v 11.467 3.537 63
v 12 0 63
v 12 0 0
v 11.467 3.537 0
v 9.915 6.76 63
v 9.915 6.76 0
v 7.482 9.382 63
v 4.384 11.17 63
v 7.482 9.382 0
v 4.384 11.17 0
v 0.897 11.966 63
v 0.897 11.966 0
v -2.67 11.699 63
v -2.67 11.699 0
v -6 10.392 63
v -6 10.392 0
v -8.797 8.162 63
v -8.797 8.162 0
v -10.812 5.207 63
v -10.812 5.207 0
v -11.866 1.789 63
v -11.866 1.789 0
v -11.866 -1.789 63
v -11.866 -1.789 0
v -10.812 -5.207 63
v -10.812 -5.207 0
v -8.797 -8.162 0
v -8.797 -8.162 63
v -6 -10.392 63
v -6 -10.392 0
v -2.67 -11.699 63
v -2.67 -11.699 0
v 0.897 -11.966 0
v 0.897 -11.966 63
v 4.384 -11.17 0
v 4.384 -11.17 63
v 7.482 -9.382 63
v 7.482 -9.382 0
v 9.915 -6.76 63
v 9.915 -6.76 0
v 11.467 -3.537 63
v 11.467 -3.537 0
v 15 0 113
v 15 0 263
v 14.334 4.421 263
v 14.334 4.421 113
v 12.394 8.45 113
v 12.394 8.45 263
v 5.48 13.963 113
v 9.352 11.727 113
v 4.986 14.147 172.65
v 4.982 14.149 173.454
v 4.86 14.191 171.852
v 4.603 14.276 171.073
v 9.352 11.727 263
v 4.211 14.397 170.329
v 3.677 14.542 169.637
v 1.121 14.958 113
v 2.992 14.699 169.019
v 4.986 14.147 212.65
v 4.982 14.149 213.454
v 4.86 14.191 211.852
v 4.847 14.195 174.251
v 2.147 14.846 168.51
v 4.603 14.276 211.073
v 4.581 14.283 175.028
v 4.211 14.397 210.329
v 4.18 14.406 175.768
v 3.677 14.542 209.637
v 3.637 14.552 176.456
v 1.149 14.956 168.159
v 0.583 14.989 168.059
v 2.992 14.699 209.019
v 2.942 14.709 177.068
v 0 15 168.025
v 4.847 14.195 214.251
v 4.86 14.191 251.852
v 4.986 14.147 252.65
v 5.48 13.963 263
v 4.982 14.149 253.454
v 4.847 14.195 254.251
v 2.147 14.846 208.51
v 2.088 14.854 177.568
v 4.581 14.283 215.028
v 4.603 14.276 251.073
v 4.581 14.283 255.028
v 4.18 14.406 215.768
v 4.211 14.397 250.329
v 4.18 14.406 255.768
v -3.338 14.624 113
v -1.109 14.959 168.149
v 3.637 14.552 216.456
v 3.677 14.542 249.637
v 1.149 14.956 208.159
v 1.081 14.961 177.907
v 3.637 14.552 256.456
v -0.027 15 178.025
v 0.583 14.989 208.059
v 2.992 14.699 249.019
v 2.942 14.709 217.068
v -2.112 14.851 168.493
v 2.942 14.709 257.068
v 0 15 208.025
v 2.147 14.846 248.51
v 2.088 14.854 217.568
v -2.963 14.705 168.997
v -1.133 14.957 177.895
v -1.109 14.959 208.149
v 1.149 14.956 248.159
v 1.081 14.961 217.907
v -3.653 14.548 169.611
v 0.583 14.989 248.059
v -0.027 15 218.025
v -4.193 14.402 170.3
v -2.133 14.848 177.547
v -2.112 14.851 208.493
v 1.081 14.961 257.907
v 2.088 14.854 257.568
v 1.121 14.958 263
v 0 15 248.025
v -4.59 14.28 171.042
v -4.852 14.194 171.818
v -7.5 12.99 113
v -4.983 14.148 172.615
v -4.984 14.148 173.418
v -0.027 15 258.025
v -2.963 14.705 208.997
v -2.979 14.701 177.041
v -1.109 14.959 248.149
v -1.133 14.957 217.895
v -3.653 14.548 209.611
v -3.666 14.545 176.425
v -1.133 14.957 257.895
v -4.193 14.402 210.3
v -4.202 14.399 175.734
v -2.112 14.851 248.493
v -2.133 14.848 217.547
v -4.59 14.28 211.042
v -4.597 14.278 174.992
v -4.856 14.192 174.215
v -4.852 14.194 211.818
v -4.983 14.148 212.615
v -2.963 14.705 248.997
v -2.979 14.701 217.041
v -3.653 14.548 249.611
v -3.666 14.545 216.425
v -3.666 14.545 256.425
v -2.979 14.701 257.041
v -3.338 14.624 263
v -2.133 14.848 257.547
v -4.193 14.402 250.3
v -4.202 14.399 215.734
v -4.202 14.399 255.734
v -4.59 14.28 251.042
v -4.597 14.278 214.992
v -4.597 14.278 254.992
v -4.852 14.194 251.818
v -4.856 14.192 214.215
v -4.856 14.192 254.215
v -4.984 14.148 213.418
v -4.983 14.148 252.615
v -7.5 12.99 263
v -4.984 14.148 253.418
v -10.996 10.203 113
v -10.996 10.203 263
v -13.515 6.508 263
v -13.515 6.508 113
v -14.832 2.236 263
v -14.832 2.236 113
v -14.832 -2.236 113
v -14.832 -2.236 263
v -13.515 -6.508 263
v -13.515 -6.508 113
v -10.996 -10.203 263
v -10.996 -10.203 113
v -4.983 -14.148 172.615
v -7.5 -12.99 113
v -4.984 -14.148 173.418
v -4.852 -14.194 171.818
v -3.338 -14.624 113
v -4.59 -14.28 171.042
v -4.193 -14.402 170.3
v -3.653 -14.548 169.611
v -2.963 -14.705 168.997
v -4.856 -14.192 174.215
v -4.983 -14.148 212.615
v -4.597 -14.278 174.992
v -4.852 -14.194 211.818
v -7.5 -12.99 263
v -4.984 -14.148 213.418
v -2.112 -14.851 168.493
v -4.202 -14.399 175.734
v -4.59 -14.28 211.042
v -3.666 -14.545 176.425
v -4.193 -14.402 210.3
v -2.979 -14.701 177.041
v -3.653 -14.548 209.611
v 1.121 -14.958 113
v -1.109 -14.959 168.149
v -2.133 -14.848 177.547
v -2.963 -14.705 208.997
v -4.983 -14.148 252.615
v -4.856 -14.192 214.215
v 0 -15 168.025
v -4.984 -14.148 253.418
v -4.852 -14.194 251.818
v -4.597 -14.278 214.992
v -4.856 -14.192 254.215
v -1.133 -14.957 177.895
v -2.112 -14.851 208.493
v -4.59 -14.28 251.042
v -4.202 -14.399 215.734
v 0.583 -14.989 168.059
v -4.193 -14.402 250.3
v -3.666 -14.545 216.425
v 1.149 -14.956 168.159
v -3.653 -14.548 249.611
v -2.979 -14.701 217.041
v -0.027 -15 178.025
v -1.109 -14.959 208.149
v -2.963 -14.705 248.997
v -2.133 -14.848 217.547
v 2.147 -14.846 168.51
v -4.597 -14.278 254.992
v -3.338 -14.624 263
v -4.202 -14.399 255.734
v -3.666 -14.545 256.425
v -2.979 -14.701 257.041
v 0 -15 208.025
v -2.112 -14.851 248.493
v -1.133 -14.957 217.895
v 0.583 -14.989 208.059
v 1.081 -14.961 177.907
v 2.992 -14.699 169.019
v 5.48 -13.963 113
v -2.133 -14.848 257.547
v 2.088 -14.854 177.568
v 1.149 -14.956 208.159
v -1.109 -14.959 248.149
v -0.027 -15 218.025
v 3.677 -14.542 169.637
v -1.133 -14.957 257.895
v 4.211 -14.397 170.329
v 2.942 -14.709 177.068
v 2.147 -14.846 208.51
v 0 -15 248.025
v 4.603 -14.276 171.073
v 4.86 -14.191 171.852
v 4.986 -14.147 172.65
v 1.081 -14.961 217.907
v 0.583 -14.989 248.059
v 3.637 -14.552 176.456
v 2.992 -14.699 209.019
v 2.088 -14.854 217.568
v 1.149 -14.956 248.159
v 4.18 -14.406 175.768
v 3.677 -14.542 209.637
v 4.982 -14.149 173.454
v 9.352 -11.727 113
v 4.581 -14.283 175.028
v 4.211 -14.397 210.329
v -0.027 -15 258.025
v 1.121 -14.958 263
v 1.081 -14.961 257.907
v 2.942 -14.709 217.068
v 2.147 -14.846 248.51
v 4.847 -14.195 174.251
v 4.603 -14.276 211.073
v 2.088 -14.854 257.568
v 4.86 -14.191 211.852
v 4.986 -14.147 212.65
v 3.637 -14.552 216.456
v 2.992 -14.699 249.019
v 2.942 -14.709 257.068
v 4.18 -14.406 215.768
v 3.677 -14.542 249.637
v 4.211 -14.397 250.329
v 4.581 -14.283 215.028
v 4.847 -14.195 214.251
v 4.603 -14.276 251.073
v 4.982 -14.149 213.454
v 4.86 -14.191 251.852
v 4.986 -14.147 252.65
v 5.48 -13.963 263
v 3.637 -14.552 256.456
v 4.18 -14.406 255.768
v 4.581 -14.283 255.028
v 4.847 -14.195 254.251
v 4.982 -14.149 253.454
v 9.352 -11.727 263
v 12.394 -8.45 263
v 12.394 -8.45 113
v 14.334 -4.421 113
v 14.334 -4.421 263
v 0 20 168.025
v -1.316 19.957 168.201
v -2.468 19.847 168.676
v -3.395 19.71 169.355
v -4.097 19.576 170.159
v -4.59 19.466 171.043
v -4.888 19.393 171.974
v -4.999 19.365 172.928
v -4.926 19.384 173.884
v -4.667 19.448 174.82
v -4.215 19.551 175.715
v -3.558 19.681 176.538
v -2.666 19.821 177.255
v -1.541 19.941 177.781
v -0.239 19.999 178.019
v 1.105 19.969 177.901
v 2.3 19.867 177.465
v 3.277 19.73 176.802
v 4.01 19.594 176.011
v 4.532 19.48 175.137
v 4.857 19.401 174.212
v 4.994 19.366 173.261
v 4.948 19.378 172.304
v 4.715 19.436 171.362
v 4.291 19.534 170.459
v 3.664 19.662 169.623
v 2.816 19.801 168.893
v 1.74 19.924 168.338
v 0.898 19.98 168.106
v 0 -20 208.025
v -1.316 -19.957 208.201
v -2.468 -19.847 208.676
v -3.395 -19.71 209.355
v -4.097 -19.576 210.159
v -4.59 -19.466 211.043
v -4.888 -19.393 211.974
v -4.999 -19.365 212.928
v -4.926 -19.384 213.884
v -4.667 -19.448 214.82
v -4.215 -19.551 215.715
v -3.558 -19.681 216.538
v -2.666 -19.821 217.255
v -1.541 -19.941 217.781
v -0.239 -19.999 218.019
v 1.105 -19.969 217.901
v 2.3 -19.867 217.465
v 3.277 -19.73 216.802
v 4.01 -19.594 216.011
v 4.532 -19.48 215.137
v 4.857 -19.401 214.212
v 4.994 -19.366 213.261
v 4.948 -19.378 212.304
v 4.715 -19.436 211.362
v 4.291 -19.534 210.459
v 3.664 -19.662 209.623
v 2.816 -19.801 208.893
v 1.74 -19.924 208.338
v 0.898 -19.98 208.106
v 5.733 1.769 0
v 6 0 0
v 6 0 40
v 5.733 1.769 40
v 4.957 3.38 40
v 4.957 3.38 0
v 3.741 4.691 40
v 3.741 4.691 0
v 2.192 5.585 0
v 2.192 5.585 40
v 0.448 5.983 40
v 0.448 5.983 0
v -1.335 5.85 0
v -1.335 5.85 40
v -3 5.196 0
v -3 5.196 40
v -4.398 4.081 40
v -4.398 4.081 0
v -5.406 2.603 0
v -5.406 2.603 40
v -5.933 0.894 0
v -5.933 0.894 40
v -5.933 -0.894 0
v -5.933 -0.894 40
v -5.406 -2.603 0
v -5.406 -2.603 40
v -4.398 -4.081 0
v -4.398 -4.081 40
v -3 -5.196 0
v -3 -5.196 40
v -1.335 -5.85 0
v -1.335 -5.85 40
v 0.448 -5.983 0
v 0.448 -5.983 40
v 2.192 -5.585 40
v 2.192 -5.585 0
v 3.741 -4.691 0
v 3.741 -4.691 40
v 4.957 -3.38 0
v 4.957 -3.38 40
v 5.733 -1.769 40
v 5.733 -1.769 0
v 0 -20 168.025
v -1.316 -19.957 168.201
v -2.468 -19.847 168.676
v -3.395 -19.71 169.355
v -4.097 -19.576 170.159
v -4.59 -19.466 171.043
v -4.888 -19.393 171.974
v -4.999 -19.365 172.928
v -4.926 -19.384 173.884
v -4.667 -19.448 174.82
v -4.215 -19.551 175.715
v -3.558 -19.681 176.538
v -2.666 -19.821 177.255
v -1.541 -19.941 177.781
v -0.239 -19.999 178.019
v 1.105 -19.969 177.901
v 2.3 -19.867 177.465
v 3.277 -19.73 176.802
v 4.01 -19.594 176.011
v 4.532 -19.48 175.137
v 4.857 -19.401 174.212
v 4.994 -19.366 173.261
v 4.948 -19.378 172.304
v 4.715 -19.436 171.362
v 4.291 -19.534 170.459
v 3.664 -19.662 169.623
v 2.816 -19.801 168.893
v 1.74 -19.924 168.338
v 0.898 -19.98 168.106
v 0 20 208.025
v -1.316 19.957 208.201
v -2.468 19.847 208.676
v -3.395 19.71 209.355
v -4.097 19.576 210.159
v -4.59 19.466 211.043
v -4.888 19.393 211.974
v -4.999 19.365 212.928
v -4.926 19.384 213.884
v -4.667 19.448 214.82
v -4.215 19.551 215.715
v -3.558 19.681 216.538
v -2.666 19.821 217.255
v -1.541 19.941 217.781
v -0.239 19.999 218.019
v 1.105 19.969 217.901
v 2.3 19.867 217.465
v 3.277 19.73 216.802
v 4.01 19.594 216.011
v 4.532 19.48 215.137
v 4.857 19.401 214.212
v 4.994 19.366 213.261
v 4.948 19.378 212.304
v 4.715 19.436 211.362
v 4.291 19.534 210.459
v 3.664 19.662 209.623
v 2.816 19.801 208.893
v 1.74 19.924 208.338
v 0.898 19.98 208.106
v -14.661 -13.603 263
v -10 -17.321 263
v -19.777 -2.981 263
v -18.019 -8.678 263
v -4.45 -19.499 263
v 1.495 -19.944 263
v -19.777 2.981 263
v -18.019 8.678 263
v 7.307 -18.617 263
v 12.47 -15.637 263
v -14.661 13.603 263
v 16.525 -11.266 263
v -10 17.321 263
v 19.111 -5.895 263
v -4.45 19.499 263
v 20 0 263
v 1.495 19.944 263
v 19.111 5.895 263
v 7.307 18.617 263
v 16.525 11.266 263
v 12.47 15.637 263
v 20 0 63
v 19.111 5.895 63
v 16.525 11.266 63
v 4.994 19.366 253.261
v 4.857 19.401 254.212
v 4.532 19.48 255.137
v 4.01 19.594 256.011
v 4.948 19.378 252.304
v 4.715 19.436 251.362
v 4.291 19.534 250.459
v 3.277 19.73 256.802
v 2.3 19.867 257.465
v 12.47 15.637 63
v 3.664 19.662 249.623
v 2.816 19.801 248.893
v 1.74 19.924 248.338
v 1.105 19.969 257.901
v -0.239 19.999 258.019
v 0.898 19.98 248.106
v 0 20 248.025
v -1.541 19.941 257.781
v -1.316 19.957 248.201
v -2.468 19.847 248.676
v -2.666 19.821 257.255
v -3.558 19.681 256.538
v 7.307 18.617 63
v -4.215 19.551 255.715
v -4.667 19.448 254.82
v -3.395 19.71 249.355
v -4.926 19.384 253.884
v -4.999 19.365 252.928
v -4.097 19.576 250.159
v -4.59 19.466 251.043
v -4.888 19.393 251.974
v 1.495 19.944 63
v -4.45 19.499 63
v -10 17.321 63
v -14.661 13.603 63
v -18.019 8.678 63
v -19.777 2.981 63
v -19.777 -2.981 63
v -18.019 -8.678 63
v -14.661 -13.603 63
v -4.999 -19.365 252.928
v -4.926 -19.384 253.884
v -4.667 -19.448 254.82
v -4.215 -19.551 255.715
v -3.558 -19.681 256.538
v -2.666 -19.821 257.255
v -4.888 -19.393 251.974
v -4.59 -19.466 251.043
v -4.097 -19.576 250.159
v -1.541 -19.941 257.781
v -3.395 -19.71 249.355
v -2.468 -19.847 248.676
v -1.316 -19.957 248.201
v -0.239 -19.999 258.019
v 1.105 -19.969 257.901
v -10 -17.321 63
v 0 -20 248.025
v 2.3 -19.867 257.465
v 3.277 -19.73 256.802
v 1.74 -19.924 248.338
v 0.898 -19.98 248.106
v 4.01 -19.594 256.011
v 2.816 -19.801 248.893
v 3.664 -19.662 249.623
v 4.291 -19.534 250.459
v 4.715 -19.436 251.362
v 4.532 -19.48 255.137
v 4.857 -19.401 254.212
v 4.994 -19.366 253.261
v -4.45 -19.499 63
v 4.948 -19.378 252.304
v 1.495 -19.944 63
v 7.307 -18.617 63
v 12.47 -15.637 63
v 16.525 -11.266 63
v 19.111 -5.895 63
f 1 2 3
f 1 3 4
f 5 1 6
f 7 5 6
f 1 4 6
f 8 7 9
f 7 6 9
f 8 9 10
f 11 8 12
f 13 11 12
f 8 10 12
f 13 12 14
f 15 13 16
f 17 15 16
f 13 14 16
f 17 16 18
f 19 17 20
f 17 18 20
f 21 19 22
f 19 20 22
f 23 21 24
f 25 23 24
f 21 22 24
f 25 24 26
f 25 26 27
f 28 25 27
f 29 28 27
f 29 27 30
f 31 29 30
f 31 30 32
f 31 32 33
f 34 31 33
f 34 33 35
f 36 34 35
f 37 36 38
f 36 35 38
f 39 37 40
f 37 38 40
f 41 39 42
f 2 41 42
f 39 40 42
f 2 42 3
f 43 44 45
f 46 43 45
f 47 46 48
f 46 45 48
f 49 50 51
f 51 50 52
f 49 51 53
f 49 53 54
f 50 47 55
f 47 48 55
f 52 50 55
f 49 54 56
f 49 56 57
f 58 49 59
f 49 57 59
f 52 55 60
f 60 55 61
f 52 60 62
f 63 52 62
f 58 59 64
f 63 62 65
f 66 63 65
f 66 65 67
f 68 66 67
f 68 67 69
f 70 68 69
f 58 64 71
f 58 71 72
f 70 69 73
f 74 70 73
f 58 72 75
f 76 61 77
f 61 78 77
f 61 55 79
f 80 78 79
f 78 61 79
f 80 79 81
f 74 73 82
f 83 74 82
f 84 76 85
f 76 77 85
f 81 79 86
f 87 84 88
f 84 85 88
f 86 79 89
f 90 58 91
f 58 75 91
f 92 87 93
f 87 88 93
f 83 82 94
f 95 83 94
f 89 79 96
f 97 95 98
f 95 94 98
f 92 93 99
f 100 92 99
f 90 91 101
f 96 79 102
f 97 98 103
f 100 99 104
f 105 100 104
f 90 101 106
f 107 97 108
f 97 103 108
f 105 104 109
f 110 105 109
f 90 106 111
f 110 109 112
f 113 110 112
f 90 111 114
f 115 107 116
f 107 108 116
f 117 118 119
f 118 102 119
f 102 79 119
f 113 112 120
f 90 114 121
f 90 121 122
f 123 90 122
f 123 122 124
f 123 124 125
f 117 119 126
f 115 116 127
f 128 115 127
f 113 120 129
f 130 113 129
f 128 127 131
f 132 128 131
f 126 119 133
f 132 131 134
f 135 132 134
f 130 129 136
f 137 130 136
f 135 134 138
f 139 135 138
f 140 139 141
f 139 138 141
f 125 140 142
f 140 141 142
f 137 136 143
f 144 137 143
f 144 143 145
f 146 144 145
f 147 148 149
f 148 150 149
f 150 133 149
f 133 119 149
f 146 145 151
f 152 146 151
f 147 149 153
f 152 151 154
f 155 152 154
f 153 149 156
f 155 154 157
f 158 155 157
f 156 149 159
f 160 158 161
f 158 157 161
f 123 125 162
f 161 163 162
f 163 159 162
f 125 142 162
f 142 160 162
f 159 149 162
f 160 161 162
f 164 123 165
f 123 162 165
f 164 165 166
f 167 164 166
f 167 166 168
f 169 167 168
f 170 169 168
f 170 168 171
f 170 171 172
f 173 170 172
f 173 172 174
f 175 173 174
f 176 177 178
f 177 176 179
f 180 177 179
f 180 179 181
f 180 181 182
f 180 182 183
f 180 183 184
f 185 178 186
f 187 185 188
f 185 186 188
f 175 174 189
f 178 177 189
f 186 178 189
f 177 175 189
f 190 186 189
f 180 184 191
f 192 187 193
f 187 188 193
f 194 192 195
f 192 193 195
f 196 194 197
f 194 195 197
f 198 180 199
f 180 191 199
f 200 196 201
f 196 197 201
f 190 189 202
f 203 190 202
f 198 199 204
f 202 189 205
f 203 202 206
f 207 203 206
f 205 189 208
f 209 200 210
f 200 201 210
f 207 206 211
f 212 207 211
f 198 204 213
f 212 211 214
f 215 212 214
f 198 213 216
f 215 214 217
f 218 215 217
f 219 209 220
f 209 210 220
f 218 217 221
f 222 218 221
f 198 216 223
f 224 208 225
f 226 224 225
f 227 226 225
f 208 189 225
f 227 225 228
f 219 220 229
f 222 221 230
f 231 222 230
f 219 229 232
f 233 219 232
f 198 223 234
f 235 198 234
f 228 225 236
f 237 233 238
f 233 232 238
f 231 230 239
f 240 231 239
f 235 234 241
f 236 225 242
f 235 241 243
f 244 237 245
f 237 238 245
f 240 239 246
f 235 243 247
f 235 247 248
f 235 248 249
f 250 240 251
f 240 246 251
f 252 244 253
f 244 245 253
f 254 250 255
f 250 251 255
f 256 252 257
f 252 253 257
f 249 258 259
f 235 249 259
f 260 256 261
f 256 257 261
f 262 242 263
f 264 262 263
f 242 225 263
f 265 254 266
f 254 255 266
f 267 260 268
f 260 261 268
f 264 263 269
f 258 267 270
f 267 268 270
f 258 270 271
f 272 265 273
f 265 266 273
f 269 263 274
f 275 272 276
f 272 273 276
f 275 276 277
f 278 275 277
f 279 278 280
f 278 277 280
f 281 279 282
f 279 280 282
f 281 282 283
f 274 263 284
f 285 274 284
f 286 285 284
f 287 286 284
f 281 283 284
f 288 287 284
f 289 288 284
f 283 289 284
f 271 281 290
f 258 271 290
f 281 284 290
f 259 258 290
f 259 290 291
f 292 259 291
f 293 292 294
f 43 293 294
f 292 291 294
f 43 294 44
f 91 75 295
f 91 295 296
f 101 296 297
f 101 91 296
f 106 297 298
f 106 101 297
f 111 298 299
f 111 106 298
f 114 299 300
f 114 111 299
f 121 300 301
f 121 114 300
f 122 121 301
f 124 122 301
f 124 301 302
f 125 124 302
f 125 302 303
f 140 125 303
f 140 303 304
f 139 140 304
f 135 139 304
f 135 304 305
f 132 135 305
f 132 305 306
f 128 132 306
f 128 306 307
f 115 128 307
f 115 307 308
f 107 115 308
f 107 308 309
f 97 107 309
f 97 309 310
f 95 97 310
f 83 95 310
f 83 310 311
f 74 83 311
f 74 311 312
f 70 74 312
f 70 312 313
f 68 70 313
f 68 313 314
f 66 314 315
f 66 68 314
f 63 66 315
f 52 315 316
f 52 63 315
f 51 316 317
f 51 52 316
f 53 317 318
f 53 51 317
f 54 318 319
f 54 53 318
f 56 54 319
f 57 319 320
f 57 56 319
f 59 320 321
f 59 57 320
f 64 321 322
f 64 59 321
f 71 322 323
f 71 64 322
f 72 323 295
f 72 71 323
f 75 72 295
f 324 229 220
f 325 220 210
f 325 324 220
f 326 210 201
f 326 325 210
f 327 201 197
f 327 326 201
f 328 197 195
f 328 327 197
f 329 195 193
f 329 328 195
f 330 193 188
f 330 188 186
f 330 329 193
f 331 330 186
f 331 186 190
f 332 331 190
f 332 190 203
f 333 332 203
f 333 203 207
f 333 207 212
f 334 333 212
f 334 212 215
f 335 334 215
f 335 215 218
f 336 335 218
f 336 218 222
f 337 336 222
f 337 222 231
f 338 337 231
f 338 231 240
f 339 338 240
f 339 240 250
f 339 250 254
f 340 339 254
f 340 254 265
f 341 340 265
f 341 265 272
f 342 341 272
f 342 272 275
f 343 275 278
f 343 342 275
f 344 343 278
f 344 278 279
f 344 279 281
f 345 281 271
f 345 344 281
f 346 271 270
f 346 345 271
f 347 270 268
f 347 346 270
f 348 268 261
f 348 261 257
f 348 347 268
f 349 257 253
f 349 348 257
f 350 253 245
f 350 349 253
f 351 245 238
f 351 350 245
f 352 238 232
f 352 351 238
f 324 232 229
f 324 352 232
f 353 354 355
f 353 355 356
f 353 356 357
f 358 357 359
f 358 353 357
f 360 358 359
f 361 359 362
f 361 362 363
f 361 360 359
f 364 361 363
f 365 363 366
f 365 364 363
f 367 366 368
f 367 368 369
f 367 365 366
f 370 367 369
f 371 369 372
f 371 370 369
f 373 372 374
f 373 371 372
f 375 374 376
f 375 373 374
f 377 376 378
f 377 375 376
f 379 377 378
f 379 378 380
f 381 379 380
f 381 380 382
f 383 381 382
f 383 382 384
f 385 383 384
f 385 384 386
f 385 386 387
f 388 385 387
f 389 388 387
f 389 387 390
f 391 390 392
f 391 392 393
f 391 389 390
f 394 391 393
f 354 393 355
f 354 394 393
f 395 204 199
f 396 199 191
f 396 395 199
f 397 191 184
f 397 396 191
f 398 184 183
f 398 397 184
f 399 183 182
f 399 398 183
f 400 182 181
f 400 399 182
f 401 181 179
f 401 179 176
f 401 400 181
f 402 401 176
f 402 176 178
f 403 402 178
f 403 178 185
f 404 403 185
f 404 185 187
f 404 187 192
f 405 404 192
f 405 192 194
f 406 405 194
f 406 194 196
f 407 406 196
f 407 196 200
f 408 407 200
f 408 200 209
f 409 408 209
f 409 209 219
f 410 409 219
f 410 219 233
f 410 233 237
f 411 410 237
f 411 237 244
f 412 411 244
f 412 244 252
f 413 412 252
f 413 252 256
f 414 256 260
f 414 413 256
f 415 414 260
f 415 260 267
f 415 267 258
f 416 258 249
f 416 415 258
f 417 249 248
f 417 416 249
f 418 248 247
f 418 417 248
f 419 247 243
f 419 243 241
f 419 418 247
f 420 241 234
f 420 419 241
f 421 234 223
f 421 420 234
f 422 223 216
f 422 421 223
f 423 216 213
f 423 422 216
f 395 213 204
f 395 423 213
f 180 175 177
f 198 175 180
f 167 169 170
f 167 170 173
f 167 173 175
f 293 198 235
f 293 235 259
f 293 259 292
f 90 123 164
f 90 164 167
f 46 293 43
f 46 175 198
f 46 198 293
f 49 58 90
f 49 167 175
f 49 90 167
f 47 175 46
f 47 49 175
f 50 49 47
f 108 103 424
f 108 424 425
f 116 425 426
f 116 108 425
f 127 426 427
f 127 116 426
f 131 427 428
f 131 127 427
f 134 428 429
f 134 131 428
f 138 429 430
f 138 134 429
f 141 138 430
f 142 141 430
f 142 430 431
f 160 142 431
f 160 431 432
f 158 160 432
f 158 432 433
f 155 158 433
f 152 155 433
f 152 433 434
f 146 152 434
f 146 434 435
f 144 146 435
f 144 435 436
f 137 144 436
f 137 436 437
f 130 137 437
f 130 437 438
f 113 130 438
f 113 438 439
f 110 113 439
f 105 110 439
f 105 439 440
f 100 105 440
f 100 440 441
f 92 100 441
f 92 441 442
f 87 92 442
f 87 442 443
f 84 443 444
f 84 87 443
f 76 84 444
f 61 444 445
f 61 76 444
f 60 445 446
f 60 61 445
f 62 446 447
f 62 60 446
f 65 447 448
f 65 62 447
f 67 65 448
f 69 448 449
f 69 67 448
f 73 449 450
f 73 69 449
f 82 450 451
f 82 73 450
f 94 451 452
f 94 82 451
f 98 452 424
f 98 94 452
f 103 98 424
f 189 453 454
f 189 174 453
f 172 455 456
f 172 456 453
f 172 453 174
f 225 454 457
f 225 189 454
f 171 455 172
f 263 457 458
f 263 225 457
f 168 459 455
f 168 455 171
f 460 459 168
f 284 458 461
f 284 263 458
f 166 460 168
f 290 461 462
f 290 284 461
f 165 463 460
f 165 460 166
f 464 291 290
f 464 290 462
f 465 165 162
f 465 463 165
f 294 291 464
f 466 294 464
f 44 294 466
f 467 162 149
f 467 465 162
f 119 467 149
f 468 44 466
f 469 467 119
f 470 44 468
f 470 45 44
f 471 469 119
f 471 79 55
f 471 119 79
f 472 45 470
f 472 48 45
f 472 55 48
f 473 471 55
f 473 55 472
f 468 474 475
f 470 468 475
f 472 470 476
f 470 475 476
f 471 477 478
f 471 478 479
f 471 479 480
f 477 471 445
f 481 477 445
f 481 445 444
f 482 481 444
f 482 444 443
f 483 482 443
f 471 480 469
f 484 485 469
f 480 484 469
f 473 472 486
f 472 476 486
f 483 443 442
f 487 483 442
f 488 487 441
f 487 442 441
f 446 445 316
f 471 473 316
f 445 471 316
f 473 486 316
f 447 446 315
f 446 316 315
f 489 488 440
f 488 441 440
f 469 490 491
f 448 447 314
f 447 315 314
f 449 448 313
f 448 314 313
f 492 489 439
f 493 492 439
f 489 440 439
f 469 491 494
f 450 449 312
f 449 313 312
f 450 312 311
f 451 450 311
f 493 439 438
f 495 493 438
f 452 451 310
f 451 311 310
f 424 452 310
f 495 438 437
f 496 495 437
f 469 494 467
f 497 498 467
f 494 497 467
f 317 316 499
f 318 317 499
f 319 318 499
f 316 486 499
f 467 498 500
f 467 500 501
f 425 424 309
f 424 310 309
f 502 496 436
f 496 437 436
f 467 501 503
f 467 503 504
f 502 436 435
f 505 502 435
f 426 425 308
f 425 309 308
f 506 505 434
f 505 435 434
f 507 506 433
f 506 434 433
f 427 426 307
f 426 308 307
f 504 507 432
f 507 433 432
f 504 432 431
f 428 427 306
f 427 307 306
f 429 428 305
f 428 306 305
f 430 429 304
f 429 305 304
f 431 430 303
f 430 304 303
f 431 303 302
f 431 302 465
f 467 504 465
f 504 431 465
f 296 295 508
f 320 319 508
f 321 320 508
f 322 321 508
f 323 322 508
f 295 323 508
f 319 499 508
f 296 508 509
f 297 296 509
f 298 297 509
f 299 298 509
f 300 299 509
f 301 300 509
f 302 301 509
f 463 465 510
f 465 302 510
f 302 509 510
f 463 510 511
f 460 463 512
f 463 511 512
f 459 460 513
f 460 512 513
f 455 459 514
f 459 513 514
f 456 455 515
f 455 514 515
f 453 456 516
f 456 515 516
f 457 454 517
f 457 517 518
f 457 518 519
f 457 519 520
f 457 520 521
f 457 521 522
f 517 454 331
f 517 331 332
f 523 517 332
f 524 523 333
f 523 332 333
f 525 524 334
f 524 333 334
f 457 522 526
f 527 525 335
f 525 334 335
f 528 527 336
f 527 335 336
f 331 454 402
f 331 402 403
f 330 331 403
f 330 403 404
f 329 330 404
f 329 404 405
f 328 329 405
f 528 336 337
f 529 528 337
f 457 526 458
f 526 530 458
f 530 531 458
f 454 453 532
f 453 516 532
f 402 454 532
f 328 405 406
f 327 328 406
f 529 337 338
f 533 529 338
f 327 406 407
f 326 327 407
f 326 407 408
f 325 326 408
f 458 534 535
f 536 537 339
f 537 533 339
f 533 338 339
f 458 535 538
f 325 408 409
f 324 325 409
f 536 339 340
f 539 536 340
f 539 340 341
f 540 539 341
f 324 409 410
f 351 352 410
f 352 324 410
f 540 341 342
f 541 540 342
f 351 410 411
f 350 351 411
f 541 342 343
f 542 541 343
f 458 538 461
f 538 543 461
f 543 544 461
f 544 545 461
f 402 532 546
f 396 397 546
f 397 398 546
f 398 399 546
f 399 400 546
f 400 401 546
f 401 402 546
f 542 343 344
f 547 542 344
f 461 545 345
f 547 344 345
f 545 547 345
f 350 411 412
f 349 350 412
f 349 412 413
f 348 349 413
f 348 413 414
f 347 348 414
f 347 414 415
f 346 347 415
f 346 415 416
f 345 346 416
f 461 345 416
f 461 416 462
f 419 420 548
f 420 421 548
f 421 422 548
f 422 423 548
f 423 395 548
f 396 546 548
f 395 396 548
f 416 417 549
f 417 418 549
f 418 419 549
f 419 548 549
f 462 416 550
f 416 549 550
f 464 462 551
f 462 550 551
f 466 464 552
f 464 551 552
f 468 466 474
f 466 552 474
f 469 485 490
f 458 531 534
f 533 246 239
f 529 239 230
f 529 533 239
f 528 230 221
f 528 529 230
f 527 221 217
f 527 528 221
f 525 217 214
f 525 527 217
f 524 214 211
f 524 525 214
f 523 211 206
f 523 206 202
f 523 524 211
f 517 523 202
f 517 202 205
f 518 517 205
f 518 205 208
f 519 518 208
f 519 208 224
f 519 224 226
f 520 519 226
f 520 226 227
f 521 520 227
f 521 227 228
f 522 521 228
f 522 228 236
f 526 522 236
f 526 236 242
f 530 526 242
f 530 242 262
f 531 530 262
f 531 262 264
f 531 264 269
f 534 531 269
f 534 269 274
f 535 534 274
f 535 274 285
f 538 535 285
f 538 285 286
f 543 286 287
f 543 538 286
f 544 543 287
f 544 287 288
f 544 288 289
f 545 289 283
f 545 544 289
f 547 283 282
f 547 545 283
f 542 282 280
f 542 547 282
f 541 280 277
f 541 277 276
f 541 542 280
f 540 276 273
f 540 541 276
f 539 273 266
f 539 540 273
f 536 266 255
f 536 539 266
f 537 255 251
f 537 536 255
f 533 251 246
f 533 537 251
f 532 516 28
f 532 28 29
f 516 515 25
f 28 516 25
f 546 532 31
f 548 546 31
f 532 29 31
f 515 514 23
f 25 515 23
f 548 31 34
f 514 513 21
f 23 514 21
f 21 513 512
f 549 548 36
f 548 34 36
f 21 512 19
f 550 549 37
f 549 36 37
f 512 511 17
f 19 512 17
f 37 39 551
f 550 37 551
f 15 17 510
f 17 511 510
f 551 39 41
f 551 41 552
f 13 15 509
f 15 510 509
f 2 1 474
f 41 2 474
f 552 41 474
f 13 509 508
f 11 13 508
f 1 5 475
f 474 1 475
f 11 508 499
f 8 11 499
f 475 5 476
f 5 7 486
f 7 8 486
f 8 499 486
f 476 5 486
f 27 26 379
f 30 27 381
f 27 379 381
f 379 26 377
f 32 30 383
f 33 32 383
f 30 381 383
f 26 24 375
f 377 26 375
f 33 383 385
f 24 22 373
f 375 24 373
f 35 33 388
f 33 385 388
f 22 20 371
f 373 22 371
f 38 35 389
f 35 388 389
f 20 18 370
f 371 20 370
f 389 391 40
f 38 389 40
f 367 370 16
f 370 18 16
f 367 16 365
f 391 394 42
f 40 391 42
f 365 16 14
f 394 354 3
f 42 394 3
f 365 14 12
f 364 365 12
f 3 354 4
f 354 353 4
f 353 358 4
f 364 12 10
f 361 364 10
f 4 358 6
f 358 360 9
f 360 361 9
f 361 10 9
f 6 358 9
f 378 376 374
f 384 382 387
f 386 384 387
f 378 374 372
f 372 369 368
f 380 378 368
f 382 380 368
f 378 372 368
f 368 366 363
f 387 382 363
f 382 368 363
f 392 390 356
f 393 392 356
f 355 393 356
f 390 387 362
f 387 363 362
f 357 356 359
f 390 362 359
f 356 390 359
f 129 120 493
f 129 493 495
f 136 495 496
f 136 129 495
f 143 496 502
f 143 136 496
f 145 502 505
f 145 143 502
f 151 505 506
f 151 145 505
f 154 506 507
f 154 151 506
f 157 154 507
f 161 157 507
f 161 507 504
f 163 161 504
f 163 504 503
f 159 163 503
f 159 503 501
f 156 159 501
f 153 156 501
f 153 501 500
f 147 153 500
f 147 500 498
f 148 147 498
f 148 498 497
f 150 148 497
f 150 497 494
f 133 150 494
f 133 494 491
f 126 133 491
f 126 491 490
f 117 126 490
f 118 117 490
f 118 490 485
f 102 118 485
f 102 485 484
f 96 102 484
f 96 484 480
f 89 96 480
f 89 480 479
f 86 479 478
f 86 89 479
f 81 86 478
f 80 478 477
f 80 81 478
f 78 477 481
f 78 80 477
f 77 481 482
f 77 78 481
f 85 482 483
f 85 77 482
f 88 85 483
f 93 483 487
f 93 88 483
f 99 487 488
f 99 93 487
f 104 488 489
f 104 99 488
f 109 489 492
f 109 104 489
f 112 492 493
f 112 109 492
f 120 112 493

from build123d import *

# Parameters (mm, degrees)
SZKIC1_R                        = 12
SZKIC1_R_2                      = 6
DODANIE_WYCI_GNI_CIE1_DEPTH     = 40
SZKIC2_R                        = 12
DODANIE_WYCI_GNI_CIE2_DEPTH     = 23
SZKIC3_R                        = 20
DODANIE_WYCI_GNI_CIE3_DEPTH     = 200
SZKIC4_R                        = 15
WYTNIJ_WYCI_GNI_CIE1_DEPTH      = 150
WYTNIJ_WYCI_GNI_CIE2_DEPTH      = 250
WYTNIJ_WYCI_GNI_CIE2_DEPTH_BACK = 250
SZKIC5_R                        = 5


with BuildPart() as part:
    # Szkic1 → Dodanie-wyciągnięcie1 (new body)
    with BuildSketch(Plane.XY):
        Circle(SZKIC1_R)
        Circle(SZKIC1_R_2, mode=Mode.SUBTRACT)
    extrude(amount=DODANIE_WYCI_GNI_CIE1_DEPTH)

    # Szkic2 → Dodanie-wyciągnięcie2 (add)
    with BuildSketch(Plane.XY.offset(40)):
        Circle(SZKIC2_R)
    extrude(amount=DODANIE_WYCI_GNI_CIE2_DEPTH)

    # Szkic3 → Dodanie-wyciągnięcie3 (add)
    with BuildSketch(Plane.XY.offset(63)):
        Circle(SZKIC3_R)
    extrude(amount=DODANIE_WYCI_GNI_CIE3_DEPTH)

    # Szkic4 → Wytnij-wyciągnięcie1 (cut)
    with BuildSketch(Plane.XY.offset(263)):
        Circle(SZKIC4_R)
    extrude(amount=-WYTNIJ_WYCI_GNI_CIE1_DEPTH, mode=Mode.SUBTRACT)

    # Szkic5 → Wytnij-wyciągnięcie2 (cut, two sides: drawn at the far end of the back side and taken through both)
    with BuildSketch(Plane(origin=(0, 0, 0), x_dir=(1, 0, 0), z_dir=(0, 1, 0)).offset(-WYTNIJ_WYCI_GNI_CIE2_DEPTH_BACK)):
        with Locations((0, -333.024962479)):
            Circle(SZKIC5_R)
        with Locations((0, -293.024962479)):
            Circle(SZKIC5_R)
        with Locations((0, -253.024962479)):
            Circle(SZKIC5_R)
        with Locations((0, -213.024962479)):
            Circle(SZKIC5_R)
        with Locations((0, -173.024962479)):
            Circle(SZKIC5_R)
    extrude(amount=WYTNIJ_WYCI_GNI_CIE2_DEPTH + WYTNIJ_WYCI_GNI_CIE2_DEPTH_BACK, mode=Mode.SUBTRACT)


solid = part.part
